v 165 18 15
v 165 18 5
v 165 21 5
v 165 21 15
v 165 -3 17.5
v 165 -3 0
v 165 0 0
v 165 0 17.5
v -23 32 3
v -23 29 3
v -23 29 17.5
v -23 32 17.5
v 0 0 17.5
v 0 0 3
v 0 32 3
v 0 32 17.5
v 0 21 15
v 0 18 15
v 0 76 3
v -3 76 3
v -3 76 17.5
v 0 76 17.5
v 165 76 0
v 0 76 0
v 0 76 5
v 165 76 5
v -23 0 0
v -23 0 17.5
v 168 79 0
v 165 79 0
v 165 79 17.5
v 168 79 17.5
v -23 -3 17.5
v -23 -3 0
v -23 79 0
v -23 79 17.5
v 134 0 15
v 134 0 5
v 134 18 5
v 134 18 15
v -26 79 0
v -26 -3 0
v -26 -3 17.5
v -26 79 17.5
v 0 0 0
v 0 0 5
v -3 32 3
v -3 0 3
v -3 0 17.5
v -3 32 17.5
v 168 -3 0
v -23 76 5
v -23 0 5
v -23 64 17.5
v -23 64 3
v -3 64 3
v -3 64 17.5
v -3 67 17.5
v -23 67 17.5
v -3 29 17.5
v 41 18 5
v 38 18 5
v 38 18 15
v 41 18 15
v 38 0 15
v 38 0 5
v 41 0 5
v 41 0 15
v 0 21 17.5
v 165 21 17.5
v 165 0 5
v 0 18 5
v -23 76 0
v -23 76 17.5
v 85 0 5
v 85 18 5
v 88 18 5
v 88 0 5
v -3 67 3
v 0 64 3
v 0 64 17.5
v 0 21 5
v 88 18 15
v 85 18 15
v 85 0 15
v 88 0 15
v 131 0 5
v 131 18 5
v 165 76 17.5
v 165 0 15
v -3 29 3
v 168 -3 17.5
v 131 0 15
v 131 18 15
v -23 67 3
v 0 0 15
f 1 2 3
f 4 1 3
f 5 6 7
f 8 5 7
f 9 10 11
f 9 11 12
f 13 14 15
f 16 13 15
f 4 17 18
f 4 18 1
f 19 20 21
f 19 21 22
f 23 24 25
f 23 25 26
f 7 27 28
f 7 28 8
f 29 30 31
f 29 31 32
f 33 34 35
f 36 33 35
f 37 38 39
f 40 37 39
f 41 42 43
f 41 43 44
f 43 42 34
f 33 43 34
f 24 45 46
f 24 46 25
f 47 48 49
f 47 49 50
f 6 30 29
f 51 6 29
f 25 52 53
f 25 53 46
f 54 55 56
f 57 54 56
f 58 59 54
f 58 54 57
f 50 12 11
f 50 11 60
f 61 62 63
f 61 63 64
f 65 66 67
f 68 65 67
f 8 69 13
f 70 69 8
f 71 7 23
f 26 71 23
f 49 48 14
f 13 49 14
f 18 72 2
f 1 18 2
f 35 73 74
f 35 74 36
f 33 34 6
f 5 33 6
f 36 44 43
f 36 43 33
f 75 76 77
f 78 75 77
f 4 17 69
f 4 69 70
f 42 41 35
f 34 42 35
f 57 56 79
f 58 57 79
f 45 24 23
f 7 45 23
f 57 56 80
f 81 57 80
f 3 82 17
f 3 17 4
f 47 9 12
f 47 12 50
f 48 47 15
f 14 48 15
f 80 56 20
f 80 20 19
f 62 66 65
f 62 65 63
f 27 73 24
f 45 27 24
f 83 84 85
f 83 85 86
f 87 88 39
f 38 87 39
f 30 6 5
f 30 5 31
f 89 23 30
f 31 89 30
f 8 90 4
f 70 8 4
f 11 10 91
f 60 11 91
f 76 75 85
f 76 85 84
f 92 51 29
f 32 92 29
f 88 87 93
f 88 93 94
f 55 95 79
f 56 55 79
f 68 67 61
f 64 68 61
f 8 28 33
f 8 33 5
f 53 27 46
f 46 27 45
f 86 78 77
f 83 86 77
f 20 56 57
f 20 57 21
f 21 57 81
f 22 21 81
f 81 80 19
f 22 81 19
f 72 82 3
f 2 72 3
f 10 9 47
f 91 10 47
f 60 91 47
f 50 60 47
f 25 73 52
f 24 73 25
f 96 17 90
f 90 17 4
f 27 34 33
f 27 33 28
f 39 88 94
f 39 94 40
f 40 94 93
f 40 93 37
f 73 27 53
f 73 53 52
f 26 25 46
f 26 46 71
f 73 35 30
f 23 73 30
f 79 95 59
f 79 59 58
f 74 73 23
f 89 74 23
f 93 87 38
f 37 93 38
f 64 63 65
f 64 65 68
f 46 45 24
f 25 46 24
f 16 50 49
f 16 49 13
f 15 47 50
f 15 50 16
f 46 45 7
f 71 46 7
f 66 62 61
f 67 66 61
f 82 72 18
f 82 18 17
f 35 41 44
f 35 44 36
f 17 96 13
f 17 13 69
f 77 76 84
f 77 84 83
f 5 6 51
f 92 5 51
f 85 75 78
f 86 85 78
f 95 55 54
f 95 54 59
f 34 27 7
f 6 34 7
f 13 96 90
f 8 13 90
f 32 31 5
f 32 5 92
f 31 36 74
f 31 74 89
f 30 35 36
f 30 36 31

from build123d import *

# Parameters (mm, degrees)
BOX_W        = 165
BOX_H        = 76
BOX_DEPTH    = 5
BOX001_W     = 3
BOX001_H     = 18
BOX001_DEPTH = 10
BOX002_W     = 165
BOX002_H     = 21
BOX002_DEPTH = 2.5
BOX004_W     = 188
BOX004_H     = 3
BOX004_DEPTH = 17.5
BOX005_W     = 188
BOX005_H     = 3
BOX005_DEPTH = 17.5
BOX006_W     = 3
BOX006_H     = 32
BOX006_DEPTH = 14.5
BOX007_W     = 3
BOX007_H     = 12
BOX007_DEPTH = 14.5
BOX008_W     = 3
BOX008_H     = 82
BOX008_DEPTH = 17.5
BOX009_W     = 165
BOX009_H     = 3
BOX009_DEPTH = 10
BOX010_W     = 3
BOX010_H     = 18
BOX010_DEPTH = 10
BOX011_W     = 23
BOX011_H     = 76
BOX011_DEPTH = 5
BOX012_W     = 20
BOX012_H     = 3
BOX012_DEPTH = 14.5
BOX013_W     = 20
BOX013_H     = 3
BOX013_DEPTH = 14.5
BOX014_W     = 3
BOX014_H     = 82
BOX014_DEPTH = 17.5
BOX015_W     = 3
BOX015_H     = 18
BOX015_DEPTH = 10


with BuildPart() as base:
    # Box → Box (new body)
    with BuildSketch(Plane.XY):
        with Locations((82.5, 38)):
            Rectangle(BOX_W, BOX_H)
    extrude(amount=BOX_DEPTH)


with BuildPart() as platform_support:
    # Box001 → Box001 (new body)
    with BuildSketch(Plane(origin=(85, 0, 5), x_dir=(1, 0, 0), z_dir=(0, 0, 1))):
        with Locations((1.5, 9)):
            Rectangle(BOX001_W, BOX001_H)
    extrude(amount=BOX001_DEPTH)


with BuildPart() as platform:
    # Box002 → Box002 (new body)
    with BuildSketch(Plane.XY.offset(15)):
        with Locations((82.5, 10.5)):
            Rectangle(BOX002_W, BOX002_H)
    extrude(amount=BOX002_DEPTH)


with BuildPart() as box004:
    # Box004 → Box004 (new body)
    with BuildSketch(Plane(origin=(-23, -3, 0), x_dir=(1, 0, 0), z_dir=(0, 0, 1))):
        with Locations((94, 1.5)):
            Rectangle(BOX004_W, BOX004_H)
    extrude(amount=BOX004_DEPTH)


with BuildPart() as box005:
    # Box005 → Box005 (new body)
    with BuildSketch(Plane(origin=(-23, 76, 0), x_dir=(1, 0, 0), z_dir=(0, 0, 1))):
        with Locations((94, 1.5)):
            Rectangle(BOX005_W, BOX005_H)
    extrude(amount=BOX005_DEPTH)


with BuildPart() as box006:
    # Box006 → Box006 (new body)
    with BuildSketch(Plane(origin=(-3, 0, 3), x_dir=(1, 0, 0), z_dir=(0, 0, 1))):
        with Locations((1.5, 16)):
            Rectangle(BOX006_W, BOX006_H)
    extrude(amount=BOX006_DEPTH)


with BuildPart() as box007:
    # Box007 → Box007 (new body)
    with BuildSketch(Plane(origin=(-3, 64, 3), x_dir=(1, 0, 0), z_dir=(0, 0, 1))):
        with Locations((1.5, 6)):
            Rectangle(BOX007_W, BOX007_H)
    extrude(amount=BOX007_DEPTH)


with BuildPart() as box008:
    # Box008 → Box008 (new body)
    with BuildSketch(Plane(origin=(165, -3, 0), x_dir=(1, 0, 0), z_dir=(0, 0, 1))):
        with Locations((1.5, 41)):
            Rectangle(BOX008_W, BOX008_H)
    extrude(amount=BOX008_DEPTH)


with BuildPart() as platform_support001:
    # Box009 → Box009 (new body)
    with BuildSketch(Plane(origin=(0, 18, 5), x_dir=(1, 0, 0), z_dir=(0, 0, 1))):
        with Locations((82.5, 1.5)):
            Rectangle(BOX009_W, BOX009_H)
    extrude(amount=BOX009_DEPTH)


with BuildPart() as platform_support002:
    # Box010 → Box010 (new body)
    with BuildSketch(Plane(origin=(131, 0, 5), x_dir=(1, 0, 0), z_dir=(0, 0, 1))):
        with Locations((1.5, 9)):
            Rectangle(BOX010_W, BOX010_H)
    extrude(amount=BOX010_DEPTH)


with BuildPart() as box011:
    # Box011 → Box011 (new body)
    with BuildSketch(Plane(origin=(-23, 0, 0), x_dir=(1, 0, 0), z_dir=(0, 0, 1))):
        with Locations((11.5, 38)):
            Rectangle(BOX011_W, BOX011_H)
    extrude(amount=BOX011_DEPTH)


with BuildPart() as box012:
    # Box012 → Box012 (new body)
    with BuildSketch(Plane(origin=(-23, 64, 3), x_dir=(1, 0, 0), z_dir=(0, 0, 1))):
        with Locations((10, 1.5)):
            Rectangle(BOX012_W, BOX012_H)
    extrude(amount=BOX012_DEPTH)


with BuildPart() as box013:
    # Box013 → Box013 (new body)
    with BuildSketch(Plane(origin=(-23, 29, 3), x_dir=(1, 0, 0), z_dir=(0, 0, 1))):
        with Locations((10, 1.5)):
            Rectangle(BOX013_W, BOX013_H)
    extrude(amount=BOX013_DEPTH)


with BuildPart() as box014:
    # Box014 → Box014 (new body)
    with BuildSketch(Plane(origin=(-26, -3, 0), x_dir=(1, 0, 0), z_dir=(0, 0, 1))):
        with Locations((1.5, 41)):
            Rectangle(BOX014_W, BOX014_H)
    extrude(amount=BOX014_DEPTH)


with BuildPart() as platform_support003:
    # Box015 → Box015 (new body)
    with BuildSketch(Plane(origin=(38, 0, 5), x_dir=(1, 0, 0), z_dir=(0, 0, 1))):
        with Locations((1.5, 9)):
            Rectangle(BOX015_W, BOX015_H)
    extrude(amount=BOX015_DEPTH)


solid = Compound([base.part, platform_support.part, platform.part, box004.part, box005.part, box006.part, box007.part, box008.part, platform_support001.part, platform_support002.part, box011.part, box012.part, box013.part, box014.part, platform_support003.part])
